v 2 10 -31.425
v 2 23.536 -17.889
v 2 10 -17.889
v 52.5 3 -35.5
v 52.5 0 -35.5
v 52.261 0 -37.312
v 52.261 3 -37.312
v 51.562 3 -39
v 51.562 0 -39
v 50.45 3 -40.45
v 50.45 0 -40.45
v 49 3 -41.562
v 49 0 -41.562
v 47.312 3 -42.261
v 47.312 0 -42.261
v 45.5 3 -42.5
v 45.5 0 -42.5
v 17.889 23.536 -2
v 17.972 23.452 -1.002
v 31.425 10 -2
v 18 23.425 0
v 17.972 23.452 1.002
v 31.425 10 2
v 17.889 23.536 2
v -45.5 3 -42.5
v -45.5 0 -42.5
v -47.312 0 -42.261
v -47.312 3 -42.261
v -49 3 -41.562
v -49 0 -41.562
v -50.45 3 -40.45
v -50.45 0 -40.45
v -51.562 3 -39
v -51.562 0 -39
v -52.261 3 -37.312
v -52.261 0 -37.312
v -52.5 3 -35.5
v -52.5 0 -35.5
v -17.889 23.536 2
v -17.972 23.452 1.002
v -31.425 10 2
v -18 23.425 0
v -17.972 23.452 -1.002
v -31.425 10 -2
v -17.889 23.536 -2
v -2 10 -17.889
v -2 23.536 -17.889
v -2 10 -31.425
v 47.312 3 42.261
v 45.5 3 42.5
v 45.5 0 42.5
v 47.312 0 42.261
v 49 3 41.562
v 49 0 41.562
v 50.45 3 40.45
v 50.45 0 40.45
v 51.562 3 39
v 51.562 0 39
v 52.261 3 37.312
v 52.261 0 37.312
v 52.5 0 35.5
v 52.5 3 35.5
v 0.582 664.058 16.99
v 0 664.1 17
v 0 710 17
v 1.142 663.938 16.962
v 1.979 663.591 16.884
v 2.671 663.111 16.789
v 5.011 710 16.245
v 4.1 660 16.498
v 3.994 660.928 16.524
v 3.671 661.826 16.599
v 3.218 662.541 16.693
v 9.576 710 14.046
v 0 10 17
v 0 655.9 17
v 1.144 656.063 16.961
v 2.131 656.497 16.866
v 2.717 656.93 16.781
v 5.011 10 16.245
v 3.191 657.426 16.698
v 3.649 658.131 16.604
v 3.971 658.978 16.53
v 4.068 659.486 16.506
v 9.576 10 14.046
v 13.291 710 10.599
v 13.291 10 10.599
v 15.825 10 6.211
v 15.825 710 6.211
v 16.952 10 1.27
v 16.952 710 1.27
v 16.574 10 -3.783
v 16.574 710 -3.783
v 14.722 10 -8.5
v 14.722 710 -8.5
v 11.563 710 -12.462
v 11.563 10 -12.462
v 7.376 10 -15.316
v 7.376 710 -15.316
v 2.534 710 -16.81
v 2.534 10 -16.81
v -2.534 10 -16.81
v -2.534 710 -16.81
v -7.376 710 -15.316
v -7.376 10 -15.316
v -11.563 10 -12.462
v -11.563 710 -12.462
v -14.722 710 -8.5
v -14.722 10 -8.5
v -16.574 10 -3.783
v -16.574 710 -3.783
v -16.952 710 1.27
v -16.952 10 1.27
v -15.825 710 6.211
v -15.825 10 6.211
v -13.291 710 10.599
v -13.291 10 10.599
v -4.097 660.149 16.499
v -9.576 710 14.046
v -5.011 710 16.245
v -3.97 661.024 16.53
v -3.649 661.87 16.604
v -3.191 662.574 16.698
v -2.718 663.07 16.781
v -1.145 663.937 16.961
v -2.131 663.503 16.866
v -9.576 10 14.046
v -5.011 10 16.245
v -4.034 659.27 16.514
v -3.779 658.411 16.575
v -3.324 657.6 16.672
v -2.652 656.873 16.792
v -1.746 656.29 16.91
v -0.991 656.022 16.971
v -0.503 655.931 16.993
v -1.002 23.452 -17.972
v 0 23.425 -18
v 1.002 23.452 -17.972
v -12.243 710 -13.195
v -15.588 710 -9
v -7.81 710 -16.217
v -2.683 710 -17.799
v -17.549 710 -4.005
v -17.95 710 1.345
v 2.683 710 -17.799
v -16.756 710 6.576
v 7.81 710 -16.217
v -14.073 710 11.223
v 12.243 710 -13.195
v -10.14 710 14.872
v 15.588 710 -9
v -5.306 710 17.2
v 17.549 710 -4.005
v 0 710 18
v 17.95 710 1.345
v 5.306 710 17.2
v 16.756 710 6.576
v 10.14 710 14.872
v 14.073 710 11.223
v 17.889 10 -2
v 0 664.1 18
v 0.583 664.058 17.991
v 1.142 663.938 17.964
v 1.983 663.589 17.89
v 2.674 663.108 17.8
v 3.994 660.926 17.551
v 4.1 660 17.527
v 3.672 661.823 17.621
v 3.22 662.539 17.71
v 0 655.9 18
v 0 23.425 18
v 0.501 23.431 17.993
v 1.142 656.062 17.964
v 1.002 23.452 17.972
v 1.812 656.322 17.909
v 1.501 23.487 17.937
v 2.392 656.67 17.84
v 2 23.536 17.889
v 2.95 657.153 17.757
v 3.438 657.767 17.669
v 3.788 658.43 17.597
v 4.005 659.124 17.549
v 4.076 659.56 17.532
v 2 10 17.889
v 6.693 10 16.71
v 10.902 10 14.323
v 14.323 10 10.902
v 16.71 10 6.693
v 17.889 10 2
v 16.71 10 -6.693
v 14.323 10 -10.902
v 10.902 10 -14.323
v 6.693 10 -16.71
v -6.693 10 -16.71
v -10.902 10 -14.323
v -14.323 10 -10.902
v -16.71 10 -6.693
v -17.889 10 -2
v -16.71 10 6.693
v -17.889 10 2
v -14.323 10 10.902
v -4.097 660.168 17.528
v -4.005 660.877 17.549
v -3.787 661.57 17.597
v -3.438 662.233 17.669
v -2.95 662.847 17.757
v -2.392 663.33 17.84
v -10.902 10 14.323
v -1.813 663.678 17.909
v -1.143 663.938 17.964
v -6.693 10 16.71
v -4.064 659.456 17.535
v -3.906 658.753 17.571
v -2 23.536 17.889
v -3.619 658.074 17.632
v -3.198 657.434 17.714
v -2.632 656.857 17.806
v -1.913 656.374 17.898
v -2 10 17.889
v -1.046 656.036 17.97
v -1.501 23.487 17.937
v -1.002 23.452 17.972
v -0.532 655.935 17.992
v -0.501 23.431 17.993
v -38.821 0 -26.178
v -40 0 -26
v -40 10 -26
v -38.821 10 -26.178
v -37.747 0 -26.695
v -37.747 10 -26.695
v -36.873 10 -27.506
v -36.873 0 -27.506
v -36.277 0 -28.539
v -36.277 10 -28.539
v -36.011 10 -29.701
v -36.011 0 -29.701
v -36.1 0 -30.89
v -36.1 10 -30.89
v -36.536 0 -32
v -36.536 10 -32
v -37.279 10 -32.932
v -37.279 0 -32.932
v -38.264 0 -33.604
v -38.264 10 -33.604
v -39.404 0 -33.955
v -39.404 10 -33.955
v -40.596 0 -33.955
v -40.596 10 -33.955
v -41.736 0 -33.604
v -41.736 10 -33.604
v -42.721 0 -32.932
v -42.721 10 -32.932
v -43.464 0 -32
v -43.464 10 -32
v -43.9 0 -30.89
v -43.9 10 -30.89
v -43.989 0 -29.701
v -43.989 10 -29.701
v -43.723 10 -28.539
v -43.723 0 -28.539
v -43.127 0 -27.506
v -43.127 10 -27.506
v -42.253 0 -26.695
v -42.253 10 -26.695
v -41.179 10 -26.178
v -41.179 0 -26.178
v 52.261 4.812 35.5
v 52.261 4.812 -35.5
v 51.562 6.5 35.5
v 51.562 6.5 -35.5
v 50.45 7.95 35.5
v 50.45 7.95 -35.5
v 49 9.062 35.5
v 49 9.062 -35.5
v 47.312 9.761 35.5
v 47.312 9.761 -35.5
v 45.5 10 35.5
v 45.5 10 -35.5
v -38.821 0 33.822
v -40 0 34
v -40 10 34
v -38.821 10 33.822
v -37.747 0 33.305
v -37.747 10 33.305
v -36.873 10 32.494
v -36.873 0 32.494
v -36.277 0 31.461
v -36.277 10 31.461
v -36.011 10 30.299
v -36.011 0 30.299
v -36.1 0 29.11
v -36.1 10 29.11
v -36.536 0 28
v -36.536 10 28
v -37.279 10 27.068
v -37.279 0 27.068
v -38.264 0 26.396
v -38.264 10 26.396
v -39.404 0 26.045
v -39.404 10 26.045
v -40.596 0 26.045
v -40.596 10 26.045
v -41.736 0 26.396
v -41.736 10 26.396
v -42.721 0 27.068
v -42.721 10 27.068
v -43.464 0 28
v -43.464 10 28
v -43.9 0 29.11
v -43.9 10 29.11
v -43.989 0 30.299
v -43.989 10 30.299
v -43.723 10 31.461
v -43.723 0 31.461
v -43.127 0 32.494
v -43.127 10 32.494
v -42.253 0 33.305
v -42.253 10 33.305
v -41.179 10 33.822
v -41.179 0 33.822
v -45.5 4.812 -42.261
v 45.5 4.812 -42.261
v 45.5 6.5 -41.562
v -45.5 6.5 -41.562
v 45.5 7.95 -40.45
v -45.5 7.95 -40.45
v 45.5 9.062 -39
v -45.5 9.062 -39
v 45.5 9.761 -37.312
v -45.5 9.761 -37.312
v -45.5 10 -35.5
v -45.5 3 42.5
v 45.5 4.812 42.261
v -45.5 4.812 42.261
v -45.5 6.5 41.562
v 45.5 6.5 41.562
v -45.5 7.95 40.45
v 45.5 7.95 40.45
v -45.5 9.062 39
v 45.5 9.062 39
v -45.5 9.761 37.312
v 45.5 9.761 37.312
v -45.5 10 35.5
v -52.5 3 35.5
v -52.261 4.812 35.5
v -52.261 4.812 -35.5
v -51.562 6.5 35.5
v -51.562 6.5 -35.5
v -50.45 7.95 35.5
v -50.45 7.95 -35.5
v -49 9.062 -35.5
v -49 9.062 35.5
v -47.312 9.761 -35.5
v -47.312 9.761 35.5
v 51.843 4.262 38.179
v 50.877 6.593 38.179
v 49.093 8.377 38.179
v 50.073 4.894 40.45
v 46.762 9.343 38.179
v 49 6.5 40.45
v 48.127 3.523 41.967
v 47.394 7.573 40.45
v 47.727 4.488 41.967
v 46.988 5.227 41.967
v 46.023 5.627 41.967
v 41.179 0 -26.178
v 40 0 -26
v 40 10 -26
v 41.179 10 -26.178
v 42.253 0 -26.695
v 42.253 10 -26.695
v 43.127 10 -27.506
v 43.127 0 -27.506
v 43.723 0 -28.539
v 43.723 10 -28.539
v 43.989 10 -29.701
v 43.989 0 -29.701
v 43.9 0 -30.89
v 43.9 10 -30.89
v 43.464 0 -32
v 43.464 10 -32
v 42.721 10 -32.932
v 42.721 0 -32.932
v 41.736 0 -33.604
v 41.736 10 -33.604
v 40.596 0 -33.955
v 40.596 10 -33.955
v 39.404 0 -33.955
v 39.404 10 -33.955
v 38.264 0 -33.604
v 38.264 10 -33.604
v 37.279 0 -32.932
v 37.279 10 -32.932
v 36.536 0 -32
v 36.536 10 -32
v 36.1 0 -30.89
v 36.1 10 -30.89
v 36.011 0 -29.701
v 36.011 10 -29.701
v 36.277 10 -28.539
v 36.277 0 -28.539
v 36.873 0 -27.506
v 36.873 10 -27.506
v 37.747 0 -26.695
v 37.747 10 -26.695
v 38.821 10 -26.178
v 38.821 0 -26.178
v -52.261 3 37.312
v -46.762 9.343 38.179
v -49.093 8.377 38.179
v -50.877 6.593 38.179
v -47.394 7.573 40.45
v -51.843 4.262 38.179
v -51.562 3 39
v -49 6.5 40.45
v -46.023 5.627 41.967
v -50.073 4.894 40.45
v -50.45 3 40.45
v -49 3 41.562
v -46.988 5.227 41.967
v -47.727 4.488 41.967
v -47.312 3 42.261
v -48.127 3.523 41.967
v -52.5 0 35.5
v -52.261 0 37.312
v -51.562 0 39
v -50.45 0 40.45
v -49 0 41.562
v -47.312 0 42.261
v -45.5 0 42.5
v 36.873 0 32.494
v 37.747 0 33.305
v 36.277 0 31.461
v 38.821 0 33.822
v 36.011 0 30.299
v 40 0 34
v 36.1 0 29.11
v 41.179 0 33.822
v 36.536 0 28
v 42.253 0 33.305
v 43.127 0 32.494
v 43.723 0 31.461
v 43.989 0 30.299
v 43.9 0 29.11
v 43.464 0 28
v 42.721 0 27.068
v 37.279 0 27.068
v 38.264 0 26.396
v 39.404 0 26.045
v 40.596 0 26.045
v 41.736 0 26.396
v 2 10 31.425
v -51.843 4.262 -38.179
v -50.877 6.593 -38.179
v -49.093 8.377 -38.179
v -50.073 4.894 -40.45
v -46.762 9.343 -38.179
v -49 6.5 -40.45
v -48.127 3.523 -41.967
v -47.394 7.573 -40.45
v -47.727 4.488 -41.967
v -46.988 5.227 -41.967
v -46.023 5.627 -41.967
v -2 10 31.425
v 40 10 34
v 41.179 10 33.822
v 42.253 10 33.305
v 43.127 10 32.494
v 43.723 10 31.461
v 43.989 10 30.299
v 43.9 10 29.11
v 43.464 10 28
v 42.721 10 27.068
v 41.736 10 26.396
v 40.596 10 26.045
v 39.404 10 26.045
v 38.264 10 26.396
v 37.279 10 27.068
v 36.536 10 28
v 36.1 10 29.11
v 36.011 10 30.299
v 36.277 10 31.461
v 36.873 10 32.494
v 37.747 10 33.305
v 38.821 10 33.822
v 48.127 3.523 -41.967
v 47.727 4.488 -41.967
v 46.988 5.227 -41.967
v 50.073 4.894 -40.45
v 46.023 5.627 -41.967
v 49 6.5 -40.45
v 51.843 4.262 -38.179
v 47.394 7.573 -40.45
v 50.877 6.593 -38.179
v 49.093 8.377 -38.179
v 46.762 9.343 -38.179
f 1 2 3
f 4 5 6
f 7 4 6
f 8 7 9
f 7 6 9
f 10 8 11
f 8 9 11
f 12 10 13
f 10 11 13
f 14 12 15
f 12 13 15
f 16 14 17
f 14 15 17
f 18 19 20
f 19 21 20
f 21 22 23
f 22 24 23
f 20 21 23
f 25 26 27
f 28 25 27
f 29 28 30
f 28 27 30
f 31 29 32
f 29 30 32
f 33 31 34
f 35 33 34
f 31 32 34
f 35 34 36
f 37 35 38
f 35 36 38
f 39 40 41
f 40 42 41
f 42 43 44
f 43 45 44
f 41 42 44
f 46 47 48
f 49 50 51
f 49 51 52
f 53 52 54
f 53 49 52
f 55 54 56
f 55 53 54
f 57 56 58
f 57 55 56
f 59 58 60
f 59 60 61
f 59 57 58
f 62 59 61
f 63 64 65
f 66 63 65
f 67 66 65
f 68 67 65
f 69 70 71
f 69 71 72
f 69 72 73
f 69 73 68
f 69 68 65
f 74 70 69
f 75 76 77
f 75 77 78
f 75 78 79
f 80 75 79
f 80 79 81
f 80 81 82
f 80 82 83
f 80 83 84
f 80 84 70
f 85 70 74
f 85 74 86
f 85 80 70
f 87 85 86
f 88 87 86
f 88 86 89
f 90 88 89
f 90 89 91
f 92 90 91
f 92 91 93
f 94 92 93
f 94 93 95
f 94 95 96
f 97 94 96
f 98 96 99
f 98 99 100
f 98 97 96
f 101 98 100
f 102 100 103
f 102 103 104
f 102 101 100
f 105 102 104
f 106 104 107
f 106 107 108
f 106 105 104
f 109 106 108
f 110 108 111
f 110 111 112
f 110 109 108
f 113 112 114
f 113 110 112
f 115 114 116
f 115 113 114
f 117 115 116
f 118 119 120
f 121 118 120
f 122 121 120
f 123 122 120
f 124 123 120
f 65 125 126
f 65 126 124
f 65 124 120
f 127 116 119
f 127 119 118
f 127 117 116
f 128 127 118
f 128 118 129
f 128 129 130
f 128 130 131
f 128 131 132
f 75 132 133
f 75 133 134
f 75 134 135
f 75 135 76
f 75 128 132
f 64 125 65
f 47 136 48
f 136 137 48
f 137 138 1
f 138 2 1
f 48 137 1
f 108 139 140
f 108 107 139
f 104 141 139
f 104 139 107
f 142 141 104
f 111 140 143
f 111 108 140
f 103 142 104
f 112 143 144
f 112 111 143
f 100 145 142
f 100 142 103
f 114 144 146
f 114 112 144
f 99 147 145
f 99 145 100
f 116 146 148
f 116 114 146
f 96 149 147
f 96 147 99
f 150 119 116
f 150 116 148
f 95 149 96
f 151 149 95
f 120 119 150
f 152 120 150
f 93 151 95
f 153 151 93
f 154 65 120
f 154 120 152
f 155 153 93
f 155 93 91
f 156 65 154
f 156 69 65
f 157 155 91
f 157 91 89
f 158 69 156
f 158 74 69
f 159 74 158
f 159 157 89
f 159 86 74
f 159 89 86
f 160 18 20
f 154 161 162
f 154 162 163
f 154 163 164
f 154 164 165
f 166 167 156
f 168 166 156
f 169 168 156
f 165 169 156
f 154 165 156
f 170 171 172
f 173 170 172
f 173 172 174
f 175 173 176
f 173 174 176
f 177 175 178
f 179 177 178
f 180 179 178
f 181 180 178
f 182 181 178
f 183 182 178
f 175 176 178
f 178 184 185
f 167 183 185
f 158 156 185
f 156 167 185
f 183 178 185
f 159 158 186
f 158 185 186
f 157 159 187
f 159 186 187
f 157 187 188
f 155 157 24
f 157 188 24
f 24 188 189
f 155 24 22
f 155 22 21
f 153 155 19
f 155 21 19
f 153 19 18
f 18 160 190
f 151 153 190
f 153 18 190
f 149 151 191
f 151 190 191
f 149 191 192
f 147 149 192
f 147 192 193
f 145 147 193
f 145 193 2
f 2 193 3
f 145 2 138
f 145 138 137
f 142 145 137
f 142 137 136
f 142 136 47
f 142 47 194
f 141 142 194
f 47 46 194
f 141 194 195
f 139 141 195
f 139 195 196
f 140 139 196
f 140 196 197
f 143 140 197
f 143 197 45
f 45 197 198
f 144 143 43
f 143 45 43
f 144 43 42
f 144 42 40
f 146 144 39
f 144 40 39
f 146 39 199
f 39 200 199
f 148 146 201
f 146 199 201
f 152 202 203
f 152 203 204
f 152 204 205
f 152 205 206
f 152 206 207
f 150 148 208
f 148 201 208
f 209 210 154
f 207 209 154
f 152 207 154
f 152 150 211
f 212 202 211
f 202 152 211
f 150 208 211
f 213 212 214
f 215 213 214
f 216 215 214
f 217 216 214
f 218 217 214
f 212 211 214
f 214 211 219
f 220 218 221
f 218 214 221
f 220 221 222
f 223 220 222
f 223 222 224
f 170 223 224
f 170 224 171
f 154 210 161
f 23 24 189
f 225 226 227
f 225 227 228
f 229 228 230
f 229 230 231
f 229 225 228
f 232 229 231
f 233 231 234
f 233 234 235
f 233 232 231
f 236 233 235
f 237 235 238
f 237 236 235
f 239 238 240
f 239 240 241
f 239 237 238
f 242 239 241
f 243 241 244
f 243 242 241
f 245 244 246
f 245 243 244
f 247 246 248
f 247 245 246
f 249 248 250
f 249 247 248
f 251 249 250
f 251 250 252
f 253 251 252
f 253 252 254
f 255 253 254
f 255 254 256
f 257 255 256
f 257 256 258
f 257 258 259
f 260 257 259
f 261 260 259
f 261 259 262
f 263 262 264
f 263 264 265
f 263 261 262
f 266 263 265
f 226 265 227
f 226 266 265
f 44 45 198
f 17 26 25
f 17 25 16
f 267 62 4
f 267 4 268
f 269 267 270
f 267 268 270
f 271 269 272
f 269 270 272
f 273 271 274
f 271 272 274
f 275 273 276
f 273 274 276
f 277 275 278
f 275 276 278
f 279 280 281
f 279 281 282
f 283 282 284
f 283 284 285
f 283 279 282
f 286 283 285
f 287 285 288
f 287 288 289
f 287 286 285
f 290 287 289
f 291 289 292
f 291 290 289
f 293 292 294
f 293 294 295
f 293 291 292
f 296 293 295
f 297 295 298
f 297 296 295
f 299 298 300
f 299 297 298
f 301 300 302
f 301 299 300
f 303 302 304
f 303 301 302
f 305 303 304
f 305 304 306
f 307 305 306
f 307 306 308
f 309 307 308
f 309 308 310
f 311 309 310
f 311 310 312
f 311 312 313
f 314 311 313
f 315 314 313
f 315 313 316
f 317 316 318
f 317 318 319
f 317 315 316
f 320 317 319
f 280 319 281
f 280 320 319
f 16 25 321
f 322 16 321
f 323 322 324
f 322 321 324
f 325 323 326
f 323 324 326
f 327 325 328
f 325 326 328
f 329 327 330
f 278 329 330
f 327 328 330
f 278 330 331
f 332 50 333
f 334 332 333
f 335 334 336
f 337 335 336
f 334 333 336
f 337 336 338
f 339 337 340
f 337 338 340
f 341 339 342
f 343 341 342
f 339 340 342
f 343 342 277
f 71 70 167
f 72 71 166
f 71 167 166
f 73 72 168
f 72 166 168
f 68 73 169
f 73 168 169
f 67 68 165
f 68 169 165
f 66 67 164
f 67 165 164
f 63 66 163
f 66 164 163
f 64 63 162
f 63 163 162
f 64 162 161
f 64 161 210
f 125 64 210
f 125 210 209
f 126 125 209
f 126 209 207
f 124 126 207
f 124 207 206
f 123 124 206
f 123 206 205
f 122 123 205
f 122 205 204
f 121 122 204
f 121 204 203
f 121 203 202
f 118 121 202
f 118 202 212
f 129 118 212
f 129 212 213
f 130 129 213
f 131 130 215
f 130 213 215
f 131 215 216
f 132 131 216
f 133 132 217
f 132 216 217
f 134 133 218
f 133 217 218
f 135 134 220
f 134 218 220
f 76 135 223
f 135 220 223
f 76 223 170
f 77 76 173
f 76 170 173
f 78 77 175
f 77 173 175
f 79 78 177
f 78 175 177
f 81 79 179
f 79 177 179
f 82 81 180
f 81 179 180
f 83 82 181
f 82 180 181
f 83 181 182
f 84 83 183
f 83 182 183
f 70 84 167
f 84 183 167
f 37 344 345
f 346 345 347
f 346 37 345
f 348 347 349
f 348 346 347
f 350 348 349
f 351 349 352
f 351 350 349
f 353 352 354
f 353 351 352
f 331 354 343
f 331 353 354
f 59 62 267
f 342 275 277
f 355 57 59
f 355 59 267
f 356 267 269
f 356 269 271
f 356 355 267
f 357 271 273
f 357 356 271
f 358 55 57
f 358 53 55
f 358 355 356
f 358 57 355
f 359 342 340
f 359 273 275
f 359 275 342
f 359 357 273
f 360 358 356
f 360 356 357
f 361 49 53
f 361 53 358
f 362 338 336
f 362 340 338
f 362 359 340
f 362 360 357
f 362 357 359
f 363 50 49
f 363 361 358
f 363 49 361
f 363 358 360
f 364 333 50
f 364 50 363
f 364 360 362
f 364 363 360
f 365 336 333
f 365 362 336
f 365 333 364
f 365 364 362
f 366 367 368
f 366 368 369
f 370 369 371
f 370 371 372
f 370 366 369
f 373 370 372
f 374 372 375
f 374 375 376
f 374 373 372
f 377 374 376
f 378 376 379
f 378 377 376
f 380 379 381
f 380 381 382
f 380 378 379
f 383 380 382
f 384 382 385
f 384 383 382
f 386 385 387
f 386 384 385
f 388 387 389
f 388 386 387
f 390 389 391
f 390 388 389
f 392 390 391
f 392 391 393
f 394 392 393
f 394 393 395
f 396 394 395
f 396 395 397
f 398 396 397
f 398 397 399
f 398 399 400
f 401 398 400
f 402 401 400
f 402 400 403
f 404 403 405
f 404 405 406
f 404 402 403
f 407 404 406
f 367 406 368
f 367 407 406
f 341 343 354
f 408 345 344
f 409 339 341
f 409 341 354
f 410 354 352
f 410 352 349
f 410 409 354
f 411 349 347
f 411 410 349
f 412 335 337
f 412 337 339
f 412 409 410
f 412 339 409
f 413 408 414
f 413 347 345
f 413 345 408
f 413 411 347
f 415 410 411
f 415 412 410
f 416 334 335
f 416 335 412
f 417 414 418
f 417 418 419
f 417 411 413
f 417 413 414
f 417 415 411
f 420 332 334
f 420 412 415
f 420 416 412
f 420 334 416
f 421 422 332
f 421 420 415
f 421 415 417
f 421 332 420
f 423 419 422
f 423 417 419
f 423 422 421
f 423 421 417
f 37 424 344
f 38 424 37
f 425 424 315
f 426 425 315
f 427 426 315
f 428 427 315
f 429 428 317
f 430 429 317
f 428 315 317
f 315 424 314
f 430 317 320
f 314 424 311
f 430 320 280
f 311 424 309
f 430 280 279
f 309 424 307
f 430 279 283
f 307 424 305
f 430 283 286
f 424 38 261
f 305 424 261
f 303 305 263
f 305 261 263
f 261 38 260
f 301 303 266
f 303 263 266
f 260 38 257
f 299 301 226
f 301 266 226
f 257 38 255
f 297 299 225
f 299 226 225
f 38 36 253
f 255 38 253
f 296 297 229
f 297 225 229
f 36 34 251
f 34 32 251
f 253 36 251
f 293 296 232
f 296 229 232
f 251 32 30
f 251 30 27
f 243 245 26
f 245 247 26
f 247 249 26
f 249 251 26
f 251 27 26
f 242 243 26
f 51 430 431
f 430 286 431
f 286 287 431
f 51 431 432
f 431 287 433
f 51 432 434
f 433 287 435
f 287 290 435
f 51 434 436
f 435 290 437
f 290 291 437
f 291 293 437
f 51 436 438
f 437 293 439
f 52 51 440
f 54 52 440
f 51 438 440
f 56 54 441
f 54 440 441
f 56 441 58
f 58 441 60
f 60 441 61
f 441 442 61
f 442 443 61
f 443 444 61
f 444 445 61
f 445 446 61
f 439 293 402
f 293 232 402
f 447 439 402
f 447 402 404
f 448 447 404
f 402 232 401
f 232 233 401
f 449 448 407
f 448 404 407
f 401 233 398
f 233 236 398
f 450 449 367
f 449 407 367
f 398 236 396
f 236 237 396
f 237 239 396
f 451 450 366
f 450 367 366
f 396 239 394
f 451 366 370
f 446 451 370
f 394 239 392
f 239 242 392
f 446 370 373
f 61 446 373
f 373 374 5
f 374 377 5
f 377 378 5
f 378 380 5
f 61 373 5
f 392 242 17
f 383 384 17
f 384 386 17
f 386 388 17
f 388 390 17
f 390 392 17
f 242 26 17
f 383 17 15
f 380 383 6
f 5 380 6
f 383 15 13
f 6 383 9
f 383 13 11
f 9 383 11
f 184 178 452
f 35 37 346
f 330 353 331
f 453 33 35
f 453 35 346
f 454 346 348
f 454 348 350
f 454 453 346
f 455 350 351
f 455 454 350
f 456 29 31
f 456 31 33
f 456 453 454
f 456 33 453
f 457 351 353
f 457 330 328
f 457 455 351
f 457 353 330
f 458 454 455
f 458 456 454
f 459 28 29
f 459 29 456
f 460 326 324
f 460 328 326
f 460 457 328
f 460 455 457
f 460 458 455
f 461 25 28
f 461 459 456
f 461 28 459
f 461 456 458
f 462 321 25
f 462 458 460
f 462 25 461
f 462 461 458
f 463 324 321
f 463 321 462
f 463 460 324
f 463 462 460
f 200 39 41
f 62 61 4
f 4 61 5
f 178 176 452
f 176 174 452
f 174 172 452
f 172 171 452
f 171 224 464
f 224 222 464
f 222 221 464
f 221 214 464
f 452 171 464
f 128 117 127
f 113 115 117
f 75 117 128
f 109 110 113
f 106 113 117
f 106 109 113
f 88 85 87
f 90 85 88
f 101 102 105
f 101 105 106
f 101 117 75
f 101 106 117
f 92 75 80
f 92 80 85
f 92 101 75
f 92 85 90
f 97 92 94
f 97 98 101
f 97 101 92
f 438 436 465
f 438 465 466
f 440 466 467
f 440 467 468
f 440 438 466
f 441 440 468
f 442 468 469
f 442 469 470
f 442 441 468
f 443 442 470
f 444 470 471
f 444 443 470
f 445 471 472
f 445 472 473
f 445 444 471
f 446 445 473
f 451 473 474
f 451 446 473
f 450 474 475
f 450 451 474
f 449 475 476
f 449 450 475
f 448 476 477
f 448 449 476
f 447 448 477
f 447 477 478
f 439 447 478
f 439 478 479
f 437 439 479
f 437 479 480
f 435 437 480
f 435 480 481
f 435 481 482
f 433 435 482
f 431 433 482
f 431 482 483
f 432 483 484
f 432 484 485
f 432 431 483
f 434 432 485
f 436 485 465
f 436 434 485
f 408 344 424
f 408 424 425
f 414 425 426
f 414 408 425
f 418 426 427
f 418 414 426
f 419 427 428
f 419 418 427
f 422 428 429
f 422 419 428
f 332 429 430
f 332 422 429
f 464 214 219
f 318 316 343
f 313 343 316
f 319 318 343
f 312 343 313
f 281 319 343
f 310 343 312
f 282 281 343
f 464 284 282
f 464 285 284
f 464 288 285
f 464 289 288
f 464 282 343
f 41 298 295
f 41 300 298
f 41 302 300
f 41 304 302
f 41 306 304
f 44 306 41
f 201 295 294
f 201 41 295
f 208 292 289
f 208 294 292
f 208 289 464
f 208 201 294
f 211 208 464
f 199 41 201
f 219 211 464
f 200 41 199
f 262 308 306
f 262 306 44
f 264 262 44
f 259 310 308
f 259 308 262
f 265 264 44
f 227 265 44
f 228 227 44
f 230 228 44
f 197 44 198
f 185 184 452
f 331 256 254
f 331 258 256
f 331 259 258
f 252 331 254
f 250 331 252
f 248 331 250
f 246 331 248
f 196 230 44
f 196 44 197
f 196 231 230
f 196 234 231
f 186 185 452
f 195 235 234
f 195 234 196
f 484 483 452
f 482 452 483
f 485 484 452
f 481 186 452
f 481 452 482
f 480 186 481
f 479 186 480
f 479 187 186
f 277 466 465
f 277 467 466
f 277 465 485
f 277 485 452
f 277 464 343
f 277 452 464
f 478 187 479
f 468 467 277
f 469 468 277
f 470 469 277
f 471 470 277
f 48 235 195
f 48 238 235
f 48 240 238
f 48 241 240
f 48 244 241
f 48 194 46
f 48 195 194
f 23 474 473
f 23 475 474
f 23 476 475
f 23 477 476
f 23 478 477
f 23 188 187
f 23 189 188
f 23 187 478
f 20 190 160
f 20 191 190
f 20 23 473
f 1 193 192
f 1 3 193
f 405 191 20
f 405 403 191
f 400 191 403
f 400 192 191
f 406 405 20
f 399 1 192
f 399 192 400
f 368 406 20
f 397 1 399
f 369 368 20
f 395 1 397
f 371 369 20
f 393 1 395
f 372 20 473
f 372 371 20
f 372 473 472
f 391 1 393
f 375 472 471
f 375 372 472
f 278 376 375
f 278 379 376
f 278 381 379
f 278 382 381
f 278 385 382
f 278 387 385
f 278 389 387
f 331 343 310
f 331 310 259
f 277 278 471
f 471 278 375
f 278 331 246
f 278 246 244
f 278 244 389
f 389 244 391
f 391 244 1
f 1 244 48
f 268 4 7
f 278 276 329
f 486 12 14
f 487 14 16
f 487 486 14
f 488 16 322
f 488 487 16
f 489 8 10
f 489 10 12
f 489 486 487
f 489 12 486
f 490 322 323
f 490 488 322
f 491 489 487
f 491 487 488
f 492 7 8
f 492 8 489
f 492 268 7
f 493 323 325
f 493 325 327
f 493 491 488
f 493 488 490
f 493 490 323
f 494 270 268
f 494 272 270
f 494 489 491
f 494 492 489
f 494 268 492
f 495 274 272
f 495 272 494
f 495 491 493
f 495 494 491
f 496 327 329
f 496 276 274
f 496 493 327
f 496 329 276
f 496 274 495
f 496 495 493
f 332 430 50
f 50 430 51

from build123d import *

# Parameters (mm, degrees)
SKETCH1_W               = 105
SKETCH1_H               = 85
SKETCH1_R               = 4
BOSS_EXTRUDE1_DEPTH     = 10
FILLET1_R               = 7
FILLET2_R               = 7
SKETCH17_R              = 18
SKETCH17_R_2            = 17
BOSS_EXTRUDE2_DEPTH     = 700
RIB2_REACH              = 715.206
SKETCH18_WALL_W         = 1447.913707502
SKETCH18_WALL_H         = 4
CIRPATTERN1_COUNT       = 4
CUT_EXTRUDE1_REACH      = 716.504
CUT_EXTRUDE1_END_RADIUS = 17
SKETCH19_R              = 4.1


with BuildPart() as part:
    # Sketch1 → Boss-Extrude1 (new body)
    with BuildSketch(Plane(origin=(0, 0, 0), x_dir=(1, 0, 0), z_dir=(0, 1, 0))):
        Rectangle(SKETCH1_W, SKETCH1_H)
        with Locations(Location((-40, -30, 0), (0, 0, 270))):
            Circle(SKETCH1_R, mode=Mode.SUBTRACT)
        with Locations(Location((40, 30, 0), (0, 0, 270))):
            Circle(SKETCH1_R, mode=Mode.SUBTRACT)
        with Locations(Location((40, -30, 0), (0, 0, 270))):
            Circle(SKETCH1_R, mode=Mode.SUBTRACT)
        with Locations(Location((-40, 30, 0), (0, 0, 270))):
            Circle(SKETCH1_R, mode=Mode.SUBTRACT)
    extrude(amount=BOSS_EXTRUDE1_DEPTH)

    # Fillet1
    fillet1_edges = [part.edges().sort_by_distance(p)[0] for p in [
        (52.5, 10, 0),
        (-52.5, 10, 0),
        (52.5, 5, 42.5),
        (-52.5, 5, 42.5),
    ]]
    fillet(fillet1_edges, radius=FILLET1_R)

    # Fillet2
    # the kernel refuses this fillet: 7 mm, written as the material it takes off along each edge
    with BuildSketch(Plane(origin=(45.5, 3, 35.5), x_dir=(0, 1, 0), z_dir=(0, 0, 1))) as fillet2_piece_1_section:
        Polygon((0, 0), (FILLET2_R, 0), (FILLET2_R, -FILLET2_R), (0, -FILLET2_R), align=None)
    fillet2_piece_1 = extrude(amount=FILLET2_R, mode=Mode.PRIVATE)
    fillet2_piece_1 = fillet2_piece_1 - Plane(origin=(45.5, 3, 35.5), x_dir=(-0.7071067811865475, -0.7071067811865475, 0), z_dir=(0, 0, 1)) * Sphere(FILLET2_R, mode=Mode.PRIVATE)
    add(fillet2_piece_1, mode=Mode.SUBTRACT)
    with BuildSketch(Plane(origin=(-45.5, 3, 35.5), x_dir=(0, 1, 0), z_dir=(0, 0, 1))) as fillet2_piece_2_section:
        Polygon((0, 0), (FILLET2_R, 0), (FILLET2_R, FILLET2_R), (0, FILLET2_R), align=None)
    fillet2_piece_2 = extrude(amount=FILLET2_R, mode=Mode.PRIVATE)
    fillet2_piece_2 = fillet2_piece_2 - Plane(origin=(-45.5, 3, 35.5), x_dir=(0.7071067811865475, -0.7071067811865475, 0), z_dir=(0, 0, 1)) * Sphere(FILLET2_R, mode=Mode.PRIVATE)
    add(fillet2_piece_2, mode=Mode.SUBTRACT)
    with BuildSketch(Plane(origin=(45.5, 10, 42.5), x_dir=(0, -1, 0), z_dir=(-1, 0, 0))) as fillet2_piece_3:
        with BuildLine():
            CenterArc((FILLET2_R, -FILLET2_R), FILLET2_R, 90, 90)
            Line((0, -FILLET2_R), (0, 0))
            Line((0, 0), (FILLET2_R, 0))
        make_face()
    extrude(amount=91, mode=Mode.SUBTRACT)
    with BuildSketch(Plane(origin=(-45.5, 10, -42.5), x_dir=(0, 0, 1), z_dir=(1, 0, 0))) as fillet2_piece_4:
        with BuildLine():
            CenterArc((FILLET2_R, FILLET2_R), FILLET2_R, 180, 90)
            Line((0, FILLET2_R), (0, 0))
            Line((0, 0), (FILLET2_R, 0))
        make_face()
    extrude(amount=91, mode=Mode.SUBTRACT)
    with BuildSketch(Plane(origin=(-52.5, -17.5, -42.5), x_dir=(0, 0, 1), z_dir=(0, 1, 0))) as fillet2_piece_5:
        with BuildLine():
            CenterArc((FILLET2_R, FILLET2_R), FILLET2_R, 180, 90)
            Line((0, FILLET2_R), (0, 0))
            Line((0, 0), (FILLET2_R, 0))
        make_face()
    extrude(amount=20.5, mode=Mode.SUBTRACT)
    with BuildSketch(Plane(origin=(52.5, -17.5, -42.5), x_dir=(0, 0, 1), z_dir=(0, 1, 0))) as fillet2_piece_6:
        with BuildLine():
            CenterArc((FILLET2_R, -FILLET2_R), FILLET2_R, 90, 90)
            Line((0, -FILLET2_R), (0, 0))
            Line((0, 0), (FILLET2_R, 0))
        make_face()
    extrude(amount=20.5, mode=Mode.SUBTRACT)
    with BuildSketch(Plane(origin=(-45.5, 3, -42.5), x_dir=(-1, 0, 0), z_dir=(0, -1, 0))) as fillet2_piece_7:
        with BuildLine():
            CenterArc((7 - FILLET2_R, -FILLET2_R), FILLET2_R, 0, 90)
            Line((7, -FILLET2_R), (7, 0))
            Line((7, 0), (7 - FILLET2_R, 0))
        make_face()
    revolve(axis=Axis((-45.5, 3, -42.5), (0, 0, -1)), revolution_arc=90, mode=Mode.SUBTRACT)
    with BuildSketch(Plane(origin=(45.5, 3, -42.5), x_dir=(1, 0, 0), z_dir=(0, -1, 0))) as fillet2_piece_8:
        with BuildLine():
            CenterArc((7 - FILLET2_R, FILLET2_R), FILLET2_R, 270, 90)
            Line((7, FILLET2_R), (7, 0))
            Line((7, 0), (7 - FILLET2_R, 0))
        make_face()
    revolve(axis=Axis((45.5, 3, -42.5), (0, 0, 1)), revolution_arc=90, mode=Mode.SUBTRACT)

    # Sketch17 → Boss-Extrude2 (add)
    with BuildSketch(Plane(origin=(0, 10, 0), x_dir=(1, 0, 0), z_dir=(0, 1, 0))):
        with Locations(Location((0, 0, 0), (0, 0, 270))):
            Circle(SKETCH17_R)
        with Locations(Location((0, 0, 0), (0, 0, 270))):
            Circle(SKETCH17_R_2, mode=Mode.SUBTRACT)
    extrude(amount=BOSS_EXTRUDE2_DEPTH)

    # Sketch18 wall → Rib2 (add, up to next)
    with BuildSketch(Plane(origin=(-24.522935069, 16.901577145, 0), x_dir=(-0.707106781187, -0.707106781187, 0), z_dir=(0.707106781187, -0.707106781187, 0)), mode=Mode.PRIVATE) as rib2_sk1:
        Rectangle(SKETCH18_WALL_W, SKETCH18_WALL_H)
    rib2_tool1 = extrude(rib2_sk1.sketch, amount=RIB2_REACH, mode=Mode.PRIVATE) - part.part
    rib2 = rib2_tool1.solids().sort_by_distance((-24.522935069, 16.901577145, 0))[0]
    add(rib2)

    # CirPattern1: Rib2 ×4 about axis
    cirpattern1_axis = Axis((0, 0, 0), (0, 1, 0))
    for i in range(1, CIRPATTERN1_COUNT):
        add(rib2.rotate(cirpattern1_axis, i * 360 / CIRPATTERN1_COUNT))

    # Cut-Extrude1: up to this cylinder (the profile starts outside it)
    cut_extrude1_end = Plane(origin=(0, 660, 0), z_dir=(0, -1, 0)) * Cylinder(CUT_EXTRUDE1_END_RADIUS, 1468.008, mode=Mode.PRIVATE)
    # Sketch19 → Cut-Extrude1 (cut, up to the surface)
    with BuildSketch(Plane.XY.offset(18), mode=Mode.PRIVATE) as cut_extrude1_sk1:
        with Locations((0, 660)):
            Circle(SKETCH19_R)
    cut_extrude1_tool1 = extrude(cut_extrude1_sk1.sketch, amount=-CUT_EXTRUDE1_REACH, mode=Mode.PRIVATE) - cut_extrude1_end
    add(cut_extrude1_tool1.solids().sort_by_distance((0, 660, 18))[0], mode=Mode.SUBTRACT)


solid = part.part
